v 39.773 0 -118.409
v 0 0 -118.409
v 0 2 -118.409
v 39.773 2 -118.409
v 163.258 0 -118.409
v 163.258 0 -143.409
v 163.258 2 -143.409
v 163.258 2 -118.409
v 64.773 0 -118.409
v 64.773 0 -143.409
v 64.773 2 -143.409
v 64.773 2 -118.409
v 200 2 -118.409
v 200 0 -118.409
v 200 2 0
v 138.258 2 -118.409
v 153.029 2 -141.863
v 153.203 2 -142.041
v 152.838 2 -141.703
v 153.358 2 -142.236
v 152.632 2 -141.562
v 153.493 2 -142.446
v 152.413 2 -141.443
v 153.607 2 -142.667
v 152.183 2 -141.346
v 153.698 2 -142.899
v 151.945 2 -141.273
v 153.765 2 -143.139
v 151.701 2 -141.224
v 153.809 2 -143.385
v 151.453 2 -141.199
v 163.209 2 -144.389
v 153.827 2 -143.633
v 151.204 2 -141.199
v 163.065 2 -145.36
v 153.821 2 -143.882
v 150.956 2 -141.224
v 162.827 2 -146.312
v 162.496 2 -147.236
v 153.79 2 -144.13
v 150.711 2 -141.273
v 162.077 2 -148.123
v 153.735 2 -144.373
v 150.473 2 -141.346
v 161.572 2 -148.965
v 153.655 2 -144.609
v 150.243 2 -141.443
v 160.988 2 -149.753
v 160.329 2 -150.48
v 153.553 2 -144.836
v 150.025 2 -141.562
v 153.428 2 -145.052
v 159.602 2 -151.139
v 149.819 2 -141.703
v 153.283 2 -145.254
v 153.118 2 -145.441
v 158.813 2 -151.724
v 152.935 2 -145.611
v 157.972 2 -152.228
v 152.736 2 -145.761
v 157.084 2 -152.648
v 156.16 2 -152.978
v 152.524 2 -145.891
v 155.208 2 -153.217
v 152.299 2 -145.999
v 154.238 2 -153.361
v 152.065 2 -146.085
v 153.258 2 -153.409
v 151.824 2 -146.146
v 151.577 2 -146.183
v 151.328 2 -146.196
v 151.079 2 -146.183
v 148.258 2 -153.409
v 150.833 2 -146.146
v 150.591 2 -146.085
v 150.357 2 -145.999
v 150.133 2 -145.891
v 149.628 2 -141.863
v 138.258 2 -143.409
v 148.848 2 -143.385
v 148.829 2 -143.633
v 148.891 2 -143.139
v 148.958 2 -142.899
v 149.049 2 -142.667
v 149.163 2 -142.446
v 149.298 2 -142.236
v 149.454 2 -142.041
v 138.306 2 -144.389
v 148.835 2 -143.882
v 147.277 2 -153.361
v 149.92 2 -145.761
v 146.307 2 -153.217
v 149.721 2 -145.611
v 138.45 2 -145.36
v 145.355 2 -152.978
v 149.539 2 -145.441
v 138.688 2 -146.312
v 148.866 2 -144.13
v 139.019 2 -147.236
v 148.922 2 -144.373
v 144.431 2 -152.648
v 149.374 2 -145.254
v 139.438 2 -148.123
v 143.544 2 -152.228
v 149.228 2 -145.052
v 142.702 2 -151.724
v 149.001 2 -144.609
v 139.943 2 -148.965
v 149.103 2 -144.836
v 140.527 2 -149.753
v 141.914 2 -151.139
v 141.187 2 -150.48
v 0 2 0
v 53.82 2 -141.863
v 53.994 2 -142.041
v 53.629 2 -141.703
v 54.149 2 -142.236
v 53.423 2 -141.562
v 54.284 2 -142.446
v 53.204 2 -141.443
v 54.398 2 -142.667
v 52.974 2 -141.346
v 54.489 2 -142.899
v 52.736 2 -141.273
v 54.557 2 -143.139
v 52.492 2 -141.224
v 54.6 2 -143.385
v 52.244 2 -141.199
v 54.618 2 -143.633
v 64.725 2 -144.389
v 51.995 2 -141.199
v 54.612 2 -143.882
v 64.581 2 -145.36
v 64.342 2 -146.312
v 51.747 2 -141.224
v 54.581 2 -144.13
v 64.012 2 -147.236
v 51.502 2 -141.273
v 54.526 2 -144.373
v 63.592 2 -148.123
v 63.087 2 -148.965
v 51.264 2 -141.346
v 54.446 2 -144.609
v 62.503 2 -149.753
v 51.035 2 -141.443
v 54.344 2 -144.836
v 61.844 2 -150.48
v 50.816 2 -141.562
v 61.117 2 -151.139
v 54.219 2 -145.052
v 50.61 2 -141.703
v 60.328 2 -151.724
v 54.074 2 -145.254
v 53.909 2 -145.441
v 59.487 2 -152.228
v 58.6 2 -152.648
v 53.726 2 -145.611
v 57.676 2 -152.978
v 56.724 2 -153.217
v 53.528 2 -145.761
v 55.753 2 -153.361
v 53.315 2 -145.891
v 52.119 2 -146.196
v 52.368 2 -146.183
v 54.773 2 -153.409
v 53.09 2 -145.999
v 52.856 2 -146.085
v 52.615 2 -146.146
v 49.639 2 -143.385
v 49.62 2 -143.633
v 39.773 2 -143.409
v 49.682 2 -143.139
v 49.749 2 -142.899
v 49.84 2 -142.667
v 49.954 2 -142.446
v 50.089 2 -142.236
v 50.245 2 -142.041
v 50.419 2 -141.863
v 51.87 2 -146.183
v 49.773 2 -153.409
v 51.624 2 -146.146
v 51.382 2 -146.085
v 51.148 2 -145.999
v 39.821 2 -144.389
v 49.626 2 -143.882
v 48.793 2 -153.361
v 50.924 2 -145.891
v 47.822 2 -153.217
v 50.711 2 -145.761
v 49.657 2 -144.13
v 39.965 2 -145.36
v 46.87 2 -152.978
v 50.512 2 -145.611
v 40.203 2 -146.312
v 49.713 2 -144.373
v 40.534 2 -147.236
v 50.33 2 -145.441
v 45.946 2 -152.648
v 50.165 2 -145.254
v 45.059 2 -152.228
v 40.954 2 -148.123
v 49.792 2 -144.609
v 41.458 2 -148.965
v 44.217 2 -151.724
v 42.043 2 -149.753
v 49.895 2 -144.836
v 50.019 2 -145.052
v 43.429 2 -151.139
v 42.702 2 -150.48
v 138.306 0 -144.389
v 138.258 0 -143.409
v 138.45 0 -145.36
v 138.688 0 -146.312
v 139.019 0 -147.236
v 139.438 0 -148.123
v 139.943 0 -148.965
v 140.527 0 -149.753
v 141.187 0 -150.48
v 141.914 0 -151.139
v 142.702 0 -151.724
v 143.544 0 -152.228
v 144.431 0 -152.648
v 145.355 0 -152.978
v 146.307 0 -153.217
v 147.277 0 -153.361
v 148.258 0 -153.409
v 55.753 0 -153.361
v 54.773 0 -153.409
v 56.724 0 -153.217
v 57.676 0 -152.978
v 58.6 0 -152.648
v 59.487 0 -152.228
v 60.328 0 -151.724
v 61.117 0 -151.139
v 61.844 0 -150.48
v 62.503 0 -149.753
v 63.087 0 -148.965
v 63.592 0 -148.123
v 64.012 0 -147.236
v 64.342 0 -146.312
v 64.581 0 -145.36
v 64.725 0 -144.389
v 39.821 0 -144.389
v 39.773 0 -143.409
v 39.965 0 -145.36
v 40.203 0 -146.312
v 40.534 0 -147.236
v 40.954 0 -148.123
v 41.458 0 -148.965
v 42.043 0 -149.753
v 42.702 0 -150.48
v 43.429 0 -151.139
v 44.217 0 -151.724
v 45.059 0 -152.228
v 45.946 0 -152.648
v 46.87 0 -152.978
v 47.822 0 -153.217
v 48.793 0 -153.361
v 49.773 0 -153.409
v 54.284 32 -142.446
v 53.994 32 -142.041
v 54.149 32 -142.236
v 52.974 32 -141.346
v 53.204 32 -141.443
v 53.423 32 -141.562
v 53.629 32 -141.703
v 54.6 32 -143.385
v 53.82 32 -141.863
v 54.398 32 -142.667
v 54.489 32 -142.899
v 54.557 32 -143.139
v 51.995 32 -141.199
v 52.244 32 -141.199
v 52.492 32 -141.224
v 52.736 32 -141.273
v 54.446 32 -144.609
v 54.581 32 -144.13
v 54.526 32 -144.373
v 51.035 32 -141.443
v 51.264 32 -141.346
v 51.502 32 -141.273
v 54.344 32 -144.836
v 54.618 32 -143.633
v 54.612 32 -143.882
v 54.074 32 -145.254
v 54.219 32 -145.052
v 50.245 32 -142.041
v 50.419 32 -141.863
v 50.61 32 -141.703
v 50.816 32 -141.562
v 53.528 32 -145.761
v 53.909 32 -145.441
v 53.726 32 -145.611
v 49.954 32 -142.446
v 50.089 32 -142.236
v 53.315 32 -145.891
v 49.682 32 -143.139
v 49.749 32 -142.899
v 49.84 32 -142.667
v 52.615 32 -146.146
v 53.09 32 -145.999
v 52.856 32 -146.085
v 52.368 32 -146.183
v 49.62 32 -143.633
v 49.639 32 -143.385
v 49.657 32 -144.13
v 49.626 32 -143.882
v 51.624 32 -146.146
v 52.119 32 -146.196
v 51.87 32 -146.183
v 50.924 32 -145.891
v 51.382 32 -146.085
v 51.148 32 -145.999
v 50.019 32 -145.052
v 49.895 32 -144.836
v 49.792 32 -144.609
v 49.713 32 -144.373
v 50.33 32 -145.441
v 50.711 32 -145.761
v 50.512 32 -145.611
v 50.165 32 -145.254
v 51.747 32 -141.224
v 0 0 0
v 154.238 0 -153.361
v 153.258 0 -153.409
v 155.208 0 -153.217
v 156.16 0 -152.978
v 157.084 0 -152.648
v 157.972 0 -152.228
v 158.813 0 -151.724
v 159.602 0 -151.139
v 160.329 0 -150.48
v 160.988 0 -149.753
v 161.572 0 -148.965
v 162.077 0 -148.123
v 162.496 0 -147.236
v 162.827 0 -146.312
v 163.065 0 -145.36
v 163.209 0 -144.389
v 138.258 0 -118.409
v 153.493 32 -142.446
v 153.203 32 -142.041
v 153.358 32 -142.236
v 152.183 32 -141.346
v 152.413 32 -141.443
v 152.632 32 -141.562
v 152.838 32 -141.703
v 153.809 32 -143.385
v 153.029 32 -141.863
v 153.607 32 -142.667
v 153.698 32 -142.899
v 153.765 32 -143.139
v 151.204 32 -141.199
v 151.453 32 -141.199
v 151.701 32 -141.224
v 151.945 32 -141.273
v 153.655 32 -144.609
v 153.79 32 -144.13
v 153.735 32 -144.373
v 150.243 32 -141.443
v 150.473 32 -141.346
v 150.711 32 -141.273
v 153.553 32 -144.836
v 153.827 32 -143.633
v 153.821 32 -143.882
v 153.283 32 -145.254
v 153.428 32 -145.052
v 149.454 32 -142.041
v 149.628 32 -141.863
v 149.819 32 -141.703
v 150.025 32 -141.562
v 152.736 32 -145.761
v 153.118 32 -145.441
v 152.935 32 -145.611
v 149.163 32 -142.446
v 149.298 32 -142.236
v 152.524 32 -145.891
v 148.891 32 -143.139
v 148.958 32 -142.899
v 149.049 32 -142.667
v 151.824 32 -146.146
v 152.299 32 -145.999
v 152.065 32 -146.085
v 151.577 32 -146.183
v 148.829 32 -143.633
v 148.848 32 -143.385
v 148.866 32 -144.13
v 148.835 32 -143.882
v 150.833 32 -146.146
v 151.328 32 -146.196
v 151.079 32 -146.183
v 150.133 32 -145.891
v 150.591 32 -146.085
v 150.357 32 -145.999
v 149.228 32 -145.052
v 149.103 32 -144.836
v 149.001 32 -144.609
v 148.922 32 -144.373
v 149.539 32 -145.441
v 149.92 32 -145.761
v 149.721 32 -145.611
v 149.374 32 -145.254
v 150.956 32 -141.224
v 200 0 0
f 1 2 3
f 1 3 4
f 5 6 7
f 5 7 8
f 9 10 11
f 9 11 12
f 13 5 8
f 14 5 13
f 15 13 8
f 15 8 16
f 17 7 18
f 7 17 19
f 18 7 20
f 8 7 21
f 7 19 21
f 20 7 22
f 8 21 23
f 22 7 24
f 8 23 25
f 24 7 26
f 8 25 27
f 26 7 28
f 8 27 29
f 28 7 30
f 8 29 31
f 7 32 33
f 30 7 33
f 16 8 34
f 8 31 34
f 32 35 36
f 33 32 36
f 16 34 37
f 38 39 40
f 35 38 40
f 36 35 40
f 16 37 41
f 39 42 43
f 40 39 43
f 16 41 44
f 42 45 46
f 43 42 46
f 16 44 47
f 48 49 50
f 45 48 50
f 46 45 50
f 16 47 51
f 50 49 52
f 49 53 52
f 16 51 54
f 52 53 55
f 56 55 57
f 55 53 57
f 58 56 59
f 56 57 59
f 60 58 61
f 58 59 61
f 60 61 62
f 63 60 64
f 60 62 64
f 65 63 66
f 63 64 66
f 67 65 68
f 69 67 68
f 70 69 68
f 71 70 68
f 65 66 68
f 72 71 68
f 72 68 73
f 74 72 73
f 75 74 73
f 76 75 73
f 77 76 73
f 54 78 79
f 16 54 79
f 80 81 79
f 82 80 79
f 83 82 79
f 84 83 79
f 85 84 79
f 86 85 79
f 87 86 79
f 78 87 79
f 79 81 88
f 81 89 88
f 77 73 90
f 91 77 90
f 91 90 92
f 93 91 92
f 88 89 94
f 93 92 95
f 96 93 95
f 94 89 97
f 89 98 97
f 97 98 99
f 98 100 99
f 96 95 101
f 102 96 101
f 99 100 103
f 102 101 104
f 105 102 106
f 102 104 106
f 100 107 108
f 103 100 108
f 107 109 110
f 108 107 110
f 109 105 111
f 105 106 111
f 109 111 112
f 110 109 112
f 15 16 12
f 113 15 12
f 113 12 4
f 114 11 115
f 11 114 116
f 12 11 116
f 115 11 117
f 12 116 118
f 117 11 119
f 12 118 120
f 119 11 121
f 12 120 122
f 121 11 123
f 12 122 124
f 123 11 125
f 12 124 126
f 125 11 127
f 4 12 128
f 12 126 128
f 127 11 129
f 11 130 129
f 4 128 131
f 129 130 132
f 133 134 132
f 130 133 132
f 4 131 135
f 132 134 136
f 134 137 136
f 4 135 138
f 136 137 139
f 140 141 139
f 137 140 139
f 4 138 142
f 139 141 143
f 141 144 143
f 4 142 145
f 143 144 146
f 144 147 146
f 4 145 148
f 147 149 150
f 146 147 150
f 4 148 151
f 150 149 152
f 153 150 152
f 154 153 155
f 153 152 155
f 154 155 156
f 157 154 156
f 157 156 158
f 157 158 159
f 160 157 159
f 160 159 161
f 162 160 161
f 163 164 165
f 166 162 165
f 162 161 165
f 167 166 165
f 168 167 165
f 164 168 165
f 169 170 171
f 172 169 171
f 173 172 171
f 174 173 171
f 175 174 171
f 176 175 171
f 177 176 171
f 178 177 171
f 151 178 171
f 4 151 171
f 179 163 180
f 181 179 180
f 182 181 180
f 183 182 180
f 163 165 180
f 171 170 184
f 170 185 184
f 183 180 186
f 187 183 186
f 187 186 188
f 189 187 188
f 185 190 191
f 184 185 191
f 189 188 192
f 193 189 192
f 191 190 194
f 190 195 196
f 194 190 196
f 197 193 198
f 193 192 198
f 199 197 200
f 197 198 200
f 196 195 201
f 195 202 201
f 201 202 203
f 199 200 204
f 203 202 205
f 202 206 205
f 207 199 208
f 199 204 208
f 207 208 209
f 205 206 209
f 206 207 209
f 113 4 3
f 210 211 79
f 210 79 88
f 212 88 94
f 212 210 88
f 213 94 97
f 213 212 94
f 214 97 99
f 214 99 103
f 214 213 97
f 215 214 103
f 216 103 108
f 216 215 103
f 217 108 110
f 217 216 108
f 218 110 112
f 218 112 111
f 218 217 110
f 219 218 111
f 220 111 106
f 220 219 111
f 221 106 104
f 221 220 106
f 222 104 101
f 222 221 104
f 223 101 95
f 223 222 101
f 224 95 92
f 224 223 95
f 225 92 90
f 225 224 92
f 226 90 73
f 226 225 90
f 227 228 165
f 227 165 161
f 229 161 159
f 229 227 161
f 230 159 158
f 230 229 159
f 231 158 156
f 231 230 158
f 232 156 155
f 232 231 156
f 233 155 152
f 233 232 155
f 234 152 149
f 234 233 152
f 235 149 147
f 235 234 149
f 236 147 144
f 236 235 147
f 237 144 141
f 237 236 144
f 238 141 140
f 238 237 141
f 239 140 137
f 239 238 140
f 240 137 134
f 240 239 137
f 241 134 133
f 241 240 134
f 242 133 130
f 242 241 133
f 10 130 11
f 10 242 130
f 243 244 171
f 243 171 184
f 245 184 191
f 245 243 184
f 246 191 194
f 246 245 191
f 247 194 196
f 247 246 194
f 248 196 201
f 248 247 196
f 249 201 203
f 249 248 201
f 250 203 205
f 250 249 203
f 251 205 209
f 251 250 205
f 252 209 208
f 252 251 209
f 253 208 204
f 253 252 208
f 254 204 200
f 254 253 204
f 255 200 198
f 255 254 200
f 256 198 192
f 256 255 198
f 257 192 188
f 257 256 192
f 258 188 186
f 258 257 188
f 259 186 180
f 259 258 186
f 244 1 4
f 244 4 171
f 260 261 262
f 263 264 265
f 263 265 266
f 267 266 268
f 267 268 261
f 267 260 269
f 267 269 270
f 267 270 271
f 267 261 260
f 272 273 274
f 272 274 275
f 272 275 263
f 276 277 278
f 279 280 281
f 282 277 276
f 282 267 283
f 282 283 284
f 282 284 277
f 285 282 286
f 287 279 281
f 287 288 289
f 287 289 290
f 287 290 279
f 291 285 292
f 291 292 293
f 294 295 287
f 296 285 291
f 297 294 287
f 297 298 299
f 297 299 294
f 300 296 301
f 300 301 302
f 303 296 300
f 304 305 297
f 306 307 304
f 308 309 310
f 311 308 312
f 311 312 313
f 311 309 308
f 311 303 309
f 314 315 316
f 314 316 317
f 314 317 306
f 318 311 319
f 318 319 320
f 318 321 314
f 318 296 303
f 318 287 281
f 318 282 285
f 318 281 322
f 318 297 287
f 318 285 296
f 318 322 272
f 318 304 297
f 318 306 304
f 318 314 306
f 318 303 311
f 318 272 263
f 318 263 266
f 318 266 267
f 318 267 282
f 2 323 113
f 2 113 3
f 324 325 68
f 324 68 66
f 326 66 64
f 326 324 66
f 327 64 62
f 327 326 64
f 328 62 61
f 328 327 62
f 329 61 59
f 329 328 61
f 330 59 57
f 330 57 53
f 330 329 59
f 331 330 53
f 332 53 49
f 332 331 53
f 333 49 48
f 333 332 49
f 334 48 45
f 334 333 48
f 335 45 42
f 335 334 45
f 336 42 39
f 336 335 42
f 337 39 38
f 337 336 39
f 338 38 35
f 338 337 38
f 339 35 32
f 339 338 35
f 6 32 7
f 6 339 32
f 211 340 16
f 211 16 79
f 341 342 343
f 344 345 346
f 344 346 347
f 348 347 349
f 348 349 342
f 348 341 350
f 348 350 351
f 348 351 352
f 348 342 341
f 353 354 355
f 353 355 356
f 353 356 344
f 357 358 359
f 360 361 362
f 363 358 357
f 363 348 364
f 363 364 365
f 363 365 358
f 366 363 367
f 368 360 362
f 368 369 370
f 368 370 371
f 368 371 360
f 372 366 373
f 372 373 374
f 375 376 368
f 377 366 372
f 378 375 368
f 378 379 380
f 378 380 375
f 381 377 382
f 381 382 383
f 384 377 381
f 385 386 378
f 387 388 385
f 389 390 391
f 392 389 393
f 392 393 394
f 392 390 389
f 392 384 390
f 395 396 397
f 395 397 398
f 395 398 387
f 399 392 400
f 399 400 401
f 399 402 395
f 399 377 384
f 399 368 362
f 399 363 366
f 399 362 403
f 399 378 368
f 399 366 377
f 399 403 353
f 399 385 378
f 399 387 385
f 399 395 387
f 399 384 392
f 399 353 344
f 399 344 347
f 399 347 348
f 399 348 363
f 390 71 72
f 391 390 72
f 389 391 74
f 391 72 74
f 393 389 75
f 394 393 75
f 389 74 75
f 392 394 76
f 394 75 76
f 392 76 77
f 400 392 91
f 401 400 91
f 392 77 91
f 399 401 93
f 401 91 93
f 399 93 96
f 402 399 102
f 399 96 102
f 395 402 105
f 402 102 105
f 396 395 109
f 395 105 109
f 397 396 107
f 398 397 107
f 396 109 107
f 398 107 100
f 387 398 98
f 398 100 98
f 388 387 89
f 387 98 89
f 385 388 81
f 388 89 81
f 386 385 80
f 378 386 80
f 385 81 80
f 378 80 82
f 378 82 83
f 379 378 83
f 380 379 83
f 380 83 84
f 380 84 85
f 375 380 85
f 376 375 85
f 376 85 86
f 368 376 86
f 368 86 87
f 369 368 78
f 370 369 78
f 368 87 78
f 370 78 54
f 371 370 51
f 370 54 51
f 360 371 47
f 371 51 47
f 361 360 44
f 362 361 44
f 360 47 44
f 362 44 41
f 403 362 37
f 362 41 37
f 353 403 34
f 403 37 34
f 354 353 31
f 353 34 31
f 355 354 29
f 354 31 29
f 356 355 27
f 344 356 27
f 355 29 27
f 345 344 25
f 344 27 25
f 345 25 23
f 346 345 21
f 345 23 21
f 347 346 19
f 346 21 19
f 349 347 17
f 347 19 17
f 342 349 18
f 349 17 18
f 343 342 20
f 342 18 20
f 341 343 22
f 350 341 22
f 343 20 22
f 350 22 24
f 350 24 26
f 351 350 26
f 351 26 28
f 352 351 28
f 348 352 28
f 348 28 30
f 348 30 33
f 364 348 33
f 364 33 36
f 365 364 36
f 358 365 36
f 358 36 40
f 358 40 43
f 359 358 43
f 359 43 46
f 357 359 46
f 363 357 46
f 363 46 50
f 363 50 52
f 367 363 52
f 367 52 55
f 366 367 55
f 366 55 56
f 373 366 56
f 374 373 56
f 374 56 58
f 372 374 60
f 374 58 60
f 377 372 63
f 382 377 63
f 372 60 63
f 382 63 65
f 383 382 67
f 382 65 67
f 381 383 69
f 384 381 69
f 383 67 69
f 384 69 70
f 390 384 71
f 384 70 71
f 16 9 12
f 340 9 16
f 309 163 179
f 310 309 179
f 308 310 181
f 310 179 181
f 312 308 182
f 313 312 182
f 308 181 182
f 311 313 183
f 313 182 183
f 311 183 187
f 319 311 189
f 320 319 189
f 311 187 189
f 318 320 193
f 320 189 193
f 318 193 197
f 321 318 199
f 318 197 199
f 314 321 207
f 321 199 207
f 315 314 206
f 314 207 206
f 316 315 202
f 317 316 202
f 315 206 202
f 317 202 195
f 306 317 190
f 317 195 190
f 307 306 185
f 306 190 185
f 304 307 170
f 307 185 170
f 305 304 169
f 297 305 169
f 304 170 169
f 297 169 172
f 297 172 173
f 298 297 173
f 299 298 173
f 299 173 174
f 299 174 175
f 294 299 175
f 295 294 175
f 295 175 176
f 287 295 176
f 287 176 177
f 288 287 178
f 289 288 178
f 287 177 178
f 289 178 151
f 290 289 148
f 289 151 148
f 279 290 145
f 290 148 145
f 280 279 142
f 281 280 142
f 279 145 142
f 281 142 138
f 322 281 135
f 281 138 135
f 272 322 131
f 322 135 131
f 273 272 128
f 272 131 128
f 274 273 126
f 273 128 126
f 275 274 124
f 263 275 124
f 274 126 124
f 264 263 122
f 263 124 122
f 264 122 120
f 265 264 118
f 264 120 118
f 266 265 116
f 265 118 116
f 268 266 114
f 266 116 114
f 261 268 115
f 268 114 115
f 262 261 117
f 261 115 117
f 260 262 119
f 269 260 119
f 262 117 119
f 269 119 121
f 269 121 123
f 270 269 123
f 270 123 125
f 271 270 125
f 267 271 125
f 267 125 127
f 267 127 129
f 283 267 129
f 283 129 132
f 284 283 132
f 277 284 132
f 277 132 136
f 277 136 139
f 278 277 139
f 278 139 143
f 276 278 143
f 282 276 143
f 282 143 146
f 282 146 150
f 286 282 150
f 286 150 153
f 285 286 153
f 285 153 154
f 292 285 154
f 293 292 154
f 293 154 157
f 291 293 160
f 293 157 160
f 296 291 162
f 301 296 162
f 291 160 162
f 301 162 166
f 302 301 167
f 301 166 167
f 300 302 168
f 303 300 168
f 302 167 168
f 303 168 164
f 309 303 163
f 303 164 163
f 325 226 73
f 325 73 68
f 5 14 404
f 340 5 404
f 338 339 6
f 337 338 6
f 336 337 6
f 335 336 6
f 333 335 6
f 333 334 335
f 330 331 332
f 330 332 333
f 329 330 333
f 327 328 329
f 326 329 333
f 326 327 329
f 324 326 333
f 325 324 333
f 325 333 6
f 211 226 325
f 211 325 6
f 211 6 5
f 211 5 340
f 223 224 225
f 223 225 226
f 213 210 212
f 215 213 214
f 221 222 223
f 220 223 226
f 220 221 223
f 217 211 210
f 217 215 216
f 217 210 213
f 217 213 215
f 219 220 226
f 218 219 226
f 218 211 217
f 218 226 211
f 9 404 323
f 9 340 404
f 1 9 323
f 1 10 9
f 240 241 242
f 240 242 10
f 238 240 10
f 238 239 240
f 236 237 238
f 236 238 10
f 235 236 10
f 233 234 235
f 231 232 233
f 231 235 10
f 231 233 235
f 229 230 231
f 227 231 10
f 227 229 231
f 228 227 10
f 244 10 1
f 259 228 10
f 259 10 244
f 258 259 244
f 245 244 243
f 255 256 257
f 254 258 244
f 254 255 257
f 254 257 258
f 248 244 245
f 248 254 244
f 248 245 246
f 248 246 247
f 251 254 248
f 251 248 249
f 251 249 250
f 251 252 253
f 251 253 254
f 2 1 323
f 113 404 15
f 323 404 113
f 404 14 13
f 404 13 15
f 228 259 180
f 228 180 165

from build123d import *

# Parameters (mm, degrees)
EXTRUDE_1_DEPTH = 2
SKETCH_2_R      = 2.5
EXTRUDE_2_DEPTH = 30


with BuildPart() as part:
    # 草图1 → 凸台-拉伸1 (new body)
    with BuildSketch(Plane(origin=(0, 0, 0), x_dir=(1, 0, 0), z_dir=(0, 1, 0))):
        with BuildLine():
            Line((64.772727273, 118.409090909), (138.257575758, 118.409090909))
            Line((138.257575758, 118.409090909), (138.257575758, 143.409090909))
            ThreePointArc((138.257575758, 143.409090909), (141.186507946, 150.480158721), (148.257575758, 153.409090909))
            Line((148.257575758, 153.409090909), (153.257575758, 153.409090909))
            ThreePointArc((153.257575758, 153.409090909), (160.328643569, 150.480158721), (163.257575758, 143.409090909))
            Line((163.257575758, 143.409090909), (163.257575758, 118.409090909))
            Line((163.257575758, 118.409090909), (200, 118.409090909))
            Line((200, 118.409090909), (200, 0))
            Line((200, 0), (0, 0))
            Line((0, 0), (0, 118.409090909))
            Line((0, 118.409090909), (39.772727273, 118.409090909))
            Line((39.772727273, 118.409090909), (39.772727273, 143.409090909))
            ThreePointArc((39.772727273, 143.409090909), (42.701659461, 150.480158721), (49.772727273, 153.409090909))
            Line((49.772727273, 153.409090909), (54.772727273, 153.409090909))
            ThreePointArc((54.772727273, 153.409090909), (61.843795085, 150.480158721), (64.772727273, 143.409090909))
            Line((64.772727273, 143.409090909), (64.772727273, 118.409090909))
        make_face()
    extrude(amount=EXTRUDE_1_DEPTH)

    # 草图2 → 凸台-拉伸2 (add)
    with BuildSketch(Plane(origin=(0, 2, 0), x_dir=(1, 0, 0), z_dir=(0, 1, 0))):
        with Locations(Location((52.11924037, 143.695636013, 0), (0, 0, 90))):
            Circle(SKETCH_2_R)
        with Locations(Location((151.328174324, 143.695636013, 0), (0, 0, 90))):
            Circle(SKETCH_2_R)
    extrude(amount=EXTRUDE_2_DEPTH)


solid = part.part
